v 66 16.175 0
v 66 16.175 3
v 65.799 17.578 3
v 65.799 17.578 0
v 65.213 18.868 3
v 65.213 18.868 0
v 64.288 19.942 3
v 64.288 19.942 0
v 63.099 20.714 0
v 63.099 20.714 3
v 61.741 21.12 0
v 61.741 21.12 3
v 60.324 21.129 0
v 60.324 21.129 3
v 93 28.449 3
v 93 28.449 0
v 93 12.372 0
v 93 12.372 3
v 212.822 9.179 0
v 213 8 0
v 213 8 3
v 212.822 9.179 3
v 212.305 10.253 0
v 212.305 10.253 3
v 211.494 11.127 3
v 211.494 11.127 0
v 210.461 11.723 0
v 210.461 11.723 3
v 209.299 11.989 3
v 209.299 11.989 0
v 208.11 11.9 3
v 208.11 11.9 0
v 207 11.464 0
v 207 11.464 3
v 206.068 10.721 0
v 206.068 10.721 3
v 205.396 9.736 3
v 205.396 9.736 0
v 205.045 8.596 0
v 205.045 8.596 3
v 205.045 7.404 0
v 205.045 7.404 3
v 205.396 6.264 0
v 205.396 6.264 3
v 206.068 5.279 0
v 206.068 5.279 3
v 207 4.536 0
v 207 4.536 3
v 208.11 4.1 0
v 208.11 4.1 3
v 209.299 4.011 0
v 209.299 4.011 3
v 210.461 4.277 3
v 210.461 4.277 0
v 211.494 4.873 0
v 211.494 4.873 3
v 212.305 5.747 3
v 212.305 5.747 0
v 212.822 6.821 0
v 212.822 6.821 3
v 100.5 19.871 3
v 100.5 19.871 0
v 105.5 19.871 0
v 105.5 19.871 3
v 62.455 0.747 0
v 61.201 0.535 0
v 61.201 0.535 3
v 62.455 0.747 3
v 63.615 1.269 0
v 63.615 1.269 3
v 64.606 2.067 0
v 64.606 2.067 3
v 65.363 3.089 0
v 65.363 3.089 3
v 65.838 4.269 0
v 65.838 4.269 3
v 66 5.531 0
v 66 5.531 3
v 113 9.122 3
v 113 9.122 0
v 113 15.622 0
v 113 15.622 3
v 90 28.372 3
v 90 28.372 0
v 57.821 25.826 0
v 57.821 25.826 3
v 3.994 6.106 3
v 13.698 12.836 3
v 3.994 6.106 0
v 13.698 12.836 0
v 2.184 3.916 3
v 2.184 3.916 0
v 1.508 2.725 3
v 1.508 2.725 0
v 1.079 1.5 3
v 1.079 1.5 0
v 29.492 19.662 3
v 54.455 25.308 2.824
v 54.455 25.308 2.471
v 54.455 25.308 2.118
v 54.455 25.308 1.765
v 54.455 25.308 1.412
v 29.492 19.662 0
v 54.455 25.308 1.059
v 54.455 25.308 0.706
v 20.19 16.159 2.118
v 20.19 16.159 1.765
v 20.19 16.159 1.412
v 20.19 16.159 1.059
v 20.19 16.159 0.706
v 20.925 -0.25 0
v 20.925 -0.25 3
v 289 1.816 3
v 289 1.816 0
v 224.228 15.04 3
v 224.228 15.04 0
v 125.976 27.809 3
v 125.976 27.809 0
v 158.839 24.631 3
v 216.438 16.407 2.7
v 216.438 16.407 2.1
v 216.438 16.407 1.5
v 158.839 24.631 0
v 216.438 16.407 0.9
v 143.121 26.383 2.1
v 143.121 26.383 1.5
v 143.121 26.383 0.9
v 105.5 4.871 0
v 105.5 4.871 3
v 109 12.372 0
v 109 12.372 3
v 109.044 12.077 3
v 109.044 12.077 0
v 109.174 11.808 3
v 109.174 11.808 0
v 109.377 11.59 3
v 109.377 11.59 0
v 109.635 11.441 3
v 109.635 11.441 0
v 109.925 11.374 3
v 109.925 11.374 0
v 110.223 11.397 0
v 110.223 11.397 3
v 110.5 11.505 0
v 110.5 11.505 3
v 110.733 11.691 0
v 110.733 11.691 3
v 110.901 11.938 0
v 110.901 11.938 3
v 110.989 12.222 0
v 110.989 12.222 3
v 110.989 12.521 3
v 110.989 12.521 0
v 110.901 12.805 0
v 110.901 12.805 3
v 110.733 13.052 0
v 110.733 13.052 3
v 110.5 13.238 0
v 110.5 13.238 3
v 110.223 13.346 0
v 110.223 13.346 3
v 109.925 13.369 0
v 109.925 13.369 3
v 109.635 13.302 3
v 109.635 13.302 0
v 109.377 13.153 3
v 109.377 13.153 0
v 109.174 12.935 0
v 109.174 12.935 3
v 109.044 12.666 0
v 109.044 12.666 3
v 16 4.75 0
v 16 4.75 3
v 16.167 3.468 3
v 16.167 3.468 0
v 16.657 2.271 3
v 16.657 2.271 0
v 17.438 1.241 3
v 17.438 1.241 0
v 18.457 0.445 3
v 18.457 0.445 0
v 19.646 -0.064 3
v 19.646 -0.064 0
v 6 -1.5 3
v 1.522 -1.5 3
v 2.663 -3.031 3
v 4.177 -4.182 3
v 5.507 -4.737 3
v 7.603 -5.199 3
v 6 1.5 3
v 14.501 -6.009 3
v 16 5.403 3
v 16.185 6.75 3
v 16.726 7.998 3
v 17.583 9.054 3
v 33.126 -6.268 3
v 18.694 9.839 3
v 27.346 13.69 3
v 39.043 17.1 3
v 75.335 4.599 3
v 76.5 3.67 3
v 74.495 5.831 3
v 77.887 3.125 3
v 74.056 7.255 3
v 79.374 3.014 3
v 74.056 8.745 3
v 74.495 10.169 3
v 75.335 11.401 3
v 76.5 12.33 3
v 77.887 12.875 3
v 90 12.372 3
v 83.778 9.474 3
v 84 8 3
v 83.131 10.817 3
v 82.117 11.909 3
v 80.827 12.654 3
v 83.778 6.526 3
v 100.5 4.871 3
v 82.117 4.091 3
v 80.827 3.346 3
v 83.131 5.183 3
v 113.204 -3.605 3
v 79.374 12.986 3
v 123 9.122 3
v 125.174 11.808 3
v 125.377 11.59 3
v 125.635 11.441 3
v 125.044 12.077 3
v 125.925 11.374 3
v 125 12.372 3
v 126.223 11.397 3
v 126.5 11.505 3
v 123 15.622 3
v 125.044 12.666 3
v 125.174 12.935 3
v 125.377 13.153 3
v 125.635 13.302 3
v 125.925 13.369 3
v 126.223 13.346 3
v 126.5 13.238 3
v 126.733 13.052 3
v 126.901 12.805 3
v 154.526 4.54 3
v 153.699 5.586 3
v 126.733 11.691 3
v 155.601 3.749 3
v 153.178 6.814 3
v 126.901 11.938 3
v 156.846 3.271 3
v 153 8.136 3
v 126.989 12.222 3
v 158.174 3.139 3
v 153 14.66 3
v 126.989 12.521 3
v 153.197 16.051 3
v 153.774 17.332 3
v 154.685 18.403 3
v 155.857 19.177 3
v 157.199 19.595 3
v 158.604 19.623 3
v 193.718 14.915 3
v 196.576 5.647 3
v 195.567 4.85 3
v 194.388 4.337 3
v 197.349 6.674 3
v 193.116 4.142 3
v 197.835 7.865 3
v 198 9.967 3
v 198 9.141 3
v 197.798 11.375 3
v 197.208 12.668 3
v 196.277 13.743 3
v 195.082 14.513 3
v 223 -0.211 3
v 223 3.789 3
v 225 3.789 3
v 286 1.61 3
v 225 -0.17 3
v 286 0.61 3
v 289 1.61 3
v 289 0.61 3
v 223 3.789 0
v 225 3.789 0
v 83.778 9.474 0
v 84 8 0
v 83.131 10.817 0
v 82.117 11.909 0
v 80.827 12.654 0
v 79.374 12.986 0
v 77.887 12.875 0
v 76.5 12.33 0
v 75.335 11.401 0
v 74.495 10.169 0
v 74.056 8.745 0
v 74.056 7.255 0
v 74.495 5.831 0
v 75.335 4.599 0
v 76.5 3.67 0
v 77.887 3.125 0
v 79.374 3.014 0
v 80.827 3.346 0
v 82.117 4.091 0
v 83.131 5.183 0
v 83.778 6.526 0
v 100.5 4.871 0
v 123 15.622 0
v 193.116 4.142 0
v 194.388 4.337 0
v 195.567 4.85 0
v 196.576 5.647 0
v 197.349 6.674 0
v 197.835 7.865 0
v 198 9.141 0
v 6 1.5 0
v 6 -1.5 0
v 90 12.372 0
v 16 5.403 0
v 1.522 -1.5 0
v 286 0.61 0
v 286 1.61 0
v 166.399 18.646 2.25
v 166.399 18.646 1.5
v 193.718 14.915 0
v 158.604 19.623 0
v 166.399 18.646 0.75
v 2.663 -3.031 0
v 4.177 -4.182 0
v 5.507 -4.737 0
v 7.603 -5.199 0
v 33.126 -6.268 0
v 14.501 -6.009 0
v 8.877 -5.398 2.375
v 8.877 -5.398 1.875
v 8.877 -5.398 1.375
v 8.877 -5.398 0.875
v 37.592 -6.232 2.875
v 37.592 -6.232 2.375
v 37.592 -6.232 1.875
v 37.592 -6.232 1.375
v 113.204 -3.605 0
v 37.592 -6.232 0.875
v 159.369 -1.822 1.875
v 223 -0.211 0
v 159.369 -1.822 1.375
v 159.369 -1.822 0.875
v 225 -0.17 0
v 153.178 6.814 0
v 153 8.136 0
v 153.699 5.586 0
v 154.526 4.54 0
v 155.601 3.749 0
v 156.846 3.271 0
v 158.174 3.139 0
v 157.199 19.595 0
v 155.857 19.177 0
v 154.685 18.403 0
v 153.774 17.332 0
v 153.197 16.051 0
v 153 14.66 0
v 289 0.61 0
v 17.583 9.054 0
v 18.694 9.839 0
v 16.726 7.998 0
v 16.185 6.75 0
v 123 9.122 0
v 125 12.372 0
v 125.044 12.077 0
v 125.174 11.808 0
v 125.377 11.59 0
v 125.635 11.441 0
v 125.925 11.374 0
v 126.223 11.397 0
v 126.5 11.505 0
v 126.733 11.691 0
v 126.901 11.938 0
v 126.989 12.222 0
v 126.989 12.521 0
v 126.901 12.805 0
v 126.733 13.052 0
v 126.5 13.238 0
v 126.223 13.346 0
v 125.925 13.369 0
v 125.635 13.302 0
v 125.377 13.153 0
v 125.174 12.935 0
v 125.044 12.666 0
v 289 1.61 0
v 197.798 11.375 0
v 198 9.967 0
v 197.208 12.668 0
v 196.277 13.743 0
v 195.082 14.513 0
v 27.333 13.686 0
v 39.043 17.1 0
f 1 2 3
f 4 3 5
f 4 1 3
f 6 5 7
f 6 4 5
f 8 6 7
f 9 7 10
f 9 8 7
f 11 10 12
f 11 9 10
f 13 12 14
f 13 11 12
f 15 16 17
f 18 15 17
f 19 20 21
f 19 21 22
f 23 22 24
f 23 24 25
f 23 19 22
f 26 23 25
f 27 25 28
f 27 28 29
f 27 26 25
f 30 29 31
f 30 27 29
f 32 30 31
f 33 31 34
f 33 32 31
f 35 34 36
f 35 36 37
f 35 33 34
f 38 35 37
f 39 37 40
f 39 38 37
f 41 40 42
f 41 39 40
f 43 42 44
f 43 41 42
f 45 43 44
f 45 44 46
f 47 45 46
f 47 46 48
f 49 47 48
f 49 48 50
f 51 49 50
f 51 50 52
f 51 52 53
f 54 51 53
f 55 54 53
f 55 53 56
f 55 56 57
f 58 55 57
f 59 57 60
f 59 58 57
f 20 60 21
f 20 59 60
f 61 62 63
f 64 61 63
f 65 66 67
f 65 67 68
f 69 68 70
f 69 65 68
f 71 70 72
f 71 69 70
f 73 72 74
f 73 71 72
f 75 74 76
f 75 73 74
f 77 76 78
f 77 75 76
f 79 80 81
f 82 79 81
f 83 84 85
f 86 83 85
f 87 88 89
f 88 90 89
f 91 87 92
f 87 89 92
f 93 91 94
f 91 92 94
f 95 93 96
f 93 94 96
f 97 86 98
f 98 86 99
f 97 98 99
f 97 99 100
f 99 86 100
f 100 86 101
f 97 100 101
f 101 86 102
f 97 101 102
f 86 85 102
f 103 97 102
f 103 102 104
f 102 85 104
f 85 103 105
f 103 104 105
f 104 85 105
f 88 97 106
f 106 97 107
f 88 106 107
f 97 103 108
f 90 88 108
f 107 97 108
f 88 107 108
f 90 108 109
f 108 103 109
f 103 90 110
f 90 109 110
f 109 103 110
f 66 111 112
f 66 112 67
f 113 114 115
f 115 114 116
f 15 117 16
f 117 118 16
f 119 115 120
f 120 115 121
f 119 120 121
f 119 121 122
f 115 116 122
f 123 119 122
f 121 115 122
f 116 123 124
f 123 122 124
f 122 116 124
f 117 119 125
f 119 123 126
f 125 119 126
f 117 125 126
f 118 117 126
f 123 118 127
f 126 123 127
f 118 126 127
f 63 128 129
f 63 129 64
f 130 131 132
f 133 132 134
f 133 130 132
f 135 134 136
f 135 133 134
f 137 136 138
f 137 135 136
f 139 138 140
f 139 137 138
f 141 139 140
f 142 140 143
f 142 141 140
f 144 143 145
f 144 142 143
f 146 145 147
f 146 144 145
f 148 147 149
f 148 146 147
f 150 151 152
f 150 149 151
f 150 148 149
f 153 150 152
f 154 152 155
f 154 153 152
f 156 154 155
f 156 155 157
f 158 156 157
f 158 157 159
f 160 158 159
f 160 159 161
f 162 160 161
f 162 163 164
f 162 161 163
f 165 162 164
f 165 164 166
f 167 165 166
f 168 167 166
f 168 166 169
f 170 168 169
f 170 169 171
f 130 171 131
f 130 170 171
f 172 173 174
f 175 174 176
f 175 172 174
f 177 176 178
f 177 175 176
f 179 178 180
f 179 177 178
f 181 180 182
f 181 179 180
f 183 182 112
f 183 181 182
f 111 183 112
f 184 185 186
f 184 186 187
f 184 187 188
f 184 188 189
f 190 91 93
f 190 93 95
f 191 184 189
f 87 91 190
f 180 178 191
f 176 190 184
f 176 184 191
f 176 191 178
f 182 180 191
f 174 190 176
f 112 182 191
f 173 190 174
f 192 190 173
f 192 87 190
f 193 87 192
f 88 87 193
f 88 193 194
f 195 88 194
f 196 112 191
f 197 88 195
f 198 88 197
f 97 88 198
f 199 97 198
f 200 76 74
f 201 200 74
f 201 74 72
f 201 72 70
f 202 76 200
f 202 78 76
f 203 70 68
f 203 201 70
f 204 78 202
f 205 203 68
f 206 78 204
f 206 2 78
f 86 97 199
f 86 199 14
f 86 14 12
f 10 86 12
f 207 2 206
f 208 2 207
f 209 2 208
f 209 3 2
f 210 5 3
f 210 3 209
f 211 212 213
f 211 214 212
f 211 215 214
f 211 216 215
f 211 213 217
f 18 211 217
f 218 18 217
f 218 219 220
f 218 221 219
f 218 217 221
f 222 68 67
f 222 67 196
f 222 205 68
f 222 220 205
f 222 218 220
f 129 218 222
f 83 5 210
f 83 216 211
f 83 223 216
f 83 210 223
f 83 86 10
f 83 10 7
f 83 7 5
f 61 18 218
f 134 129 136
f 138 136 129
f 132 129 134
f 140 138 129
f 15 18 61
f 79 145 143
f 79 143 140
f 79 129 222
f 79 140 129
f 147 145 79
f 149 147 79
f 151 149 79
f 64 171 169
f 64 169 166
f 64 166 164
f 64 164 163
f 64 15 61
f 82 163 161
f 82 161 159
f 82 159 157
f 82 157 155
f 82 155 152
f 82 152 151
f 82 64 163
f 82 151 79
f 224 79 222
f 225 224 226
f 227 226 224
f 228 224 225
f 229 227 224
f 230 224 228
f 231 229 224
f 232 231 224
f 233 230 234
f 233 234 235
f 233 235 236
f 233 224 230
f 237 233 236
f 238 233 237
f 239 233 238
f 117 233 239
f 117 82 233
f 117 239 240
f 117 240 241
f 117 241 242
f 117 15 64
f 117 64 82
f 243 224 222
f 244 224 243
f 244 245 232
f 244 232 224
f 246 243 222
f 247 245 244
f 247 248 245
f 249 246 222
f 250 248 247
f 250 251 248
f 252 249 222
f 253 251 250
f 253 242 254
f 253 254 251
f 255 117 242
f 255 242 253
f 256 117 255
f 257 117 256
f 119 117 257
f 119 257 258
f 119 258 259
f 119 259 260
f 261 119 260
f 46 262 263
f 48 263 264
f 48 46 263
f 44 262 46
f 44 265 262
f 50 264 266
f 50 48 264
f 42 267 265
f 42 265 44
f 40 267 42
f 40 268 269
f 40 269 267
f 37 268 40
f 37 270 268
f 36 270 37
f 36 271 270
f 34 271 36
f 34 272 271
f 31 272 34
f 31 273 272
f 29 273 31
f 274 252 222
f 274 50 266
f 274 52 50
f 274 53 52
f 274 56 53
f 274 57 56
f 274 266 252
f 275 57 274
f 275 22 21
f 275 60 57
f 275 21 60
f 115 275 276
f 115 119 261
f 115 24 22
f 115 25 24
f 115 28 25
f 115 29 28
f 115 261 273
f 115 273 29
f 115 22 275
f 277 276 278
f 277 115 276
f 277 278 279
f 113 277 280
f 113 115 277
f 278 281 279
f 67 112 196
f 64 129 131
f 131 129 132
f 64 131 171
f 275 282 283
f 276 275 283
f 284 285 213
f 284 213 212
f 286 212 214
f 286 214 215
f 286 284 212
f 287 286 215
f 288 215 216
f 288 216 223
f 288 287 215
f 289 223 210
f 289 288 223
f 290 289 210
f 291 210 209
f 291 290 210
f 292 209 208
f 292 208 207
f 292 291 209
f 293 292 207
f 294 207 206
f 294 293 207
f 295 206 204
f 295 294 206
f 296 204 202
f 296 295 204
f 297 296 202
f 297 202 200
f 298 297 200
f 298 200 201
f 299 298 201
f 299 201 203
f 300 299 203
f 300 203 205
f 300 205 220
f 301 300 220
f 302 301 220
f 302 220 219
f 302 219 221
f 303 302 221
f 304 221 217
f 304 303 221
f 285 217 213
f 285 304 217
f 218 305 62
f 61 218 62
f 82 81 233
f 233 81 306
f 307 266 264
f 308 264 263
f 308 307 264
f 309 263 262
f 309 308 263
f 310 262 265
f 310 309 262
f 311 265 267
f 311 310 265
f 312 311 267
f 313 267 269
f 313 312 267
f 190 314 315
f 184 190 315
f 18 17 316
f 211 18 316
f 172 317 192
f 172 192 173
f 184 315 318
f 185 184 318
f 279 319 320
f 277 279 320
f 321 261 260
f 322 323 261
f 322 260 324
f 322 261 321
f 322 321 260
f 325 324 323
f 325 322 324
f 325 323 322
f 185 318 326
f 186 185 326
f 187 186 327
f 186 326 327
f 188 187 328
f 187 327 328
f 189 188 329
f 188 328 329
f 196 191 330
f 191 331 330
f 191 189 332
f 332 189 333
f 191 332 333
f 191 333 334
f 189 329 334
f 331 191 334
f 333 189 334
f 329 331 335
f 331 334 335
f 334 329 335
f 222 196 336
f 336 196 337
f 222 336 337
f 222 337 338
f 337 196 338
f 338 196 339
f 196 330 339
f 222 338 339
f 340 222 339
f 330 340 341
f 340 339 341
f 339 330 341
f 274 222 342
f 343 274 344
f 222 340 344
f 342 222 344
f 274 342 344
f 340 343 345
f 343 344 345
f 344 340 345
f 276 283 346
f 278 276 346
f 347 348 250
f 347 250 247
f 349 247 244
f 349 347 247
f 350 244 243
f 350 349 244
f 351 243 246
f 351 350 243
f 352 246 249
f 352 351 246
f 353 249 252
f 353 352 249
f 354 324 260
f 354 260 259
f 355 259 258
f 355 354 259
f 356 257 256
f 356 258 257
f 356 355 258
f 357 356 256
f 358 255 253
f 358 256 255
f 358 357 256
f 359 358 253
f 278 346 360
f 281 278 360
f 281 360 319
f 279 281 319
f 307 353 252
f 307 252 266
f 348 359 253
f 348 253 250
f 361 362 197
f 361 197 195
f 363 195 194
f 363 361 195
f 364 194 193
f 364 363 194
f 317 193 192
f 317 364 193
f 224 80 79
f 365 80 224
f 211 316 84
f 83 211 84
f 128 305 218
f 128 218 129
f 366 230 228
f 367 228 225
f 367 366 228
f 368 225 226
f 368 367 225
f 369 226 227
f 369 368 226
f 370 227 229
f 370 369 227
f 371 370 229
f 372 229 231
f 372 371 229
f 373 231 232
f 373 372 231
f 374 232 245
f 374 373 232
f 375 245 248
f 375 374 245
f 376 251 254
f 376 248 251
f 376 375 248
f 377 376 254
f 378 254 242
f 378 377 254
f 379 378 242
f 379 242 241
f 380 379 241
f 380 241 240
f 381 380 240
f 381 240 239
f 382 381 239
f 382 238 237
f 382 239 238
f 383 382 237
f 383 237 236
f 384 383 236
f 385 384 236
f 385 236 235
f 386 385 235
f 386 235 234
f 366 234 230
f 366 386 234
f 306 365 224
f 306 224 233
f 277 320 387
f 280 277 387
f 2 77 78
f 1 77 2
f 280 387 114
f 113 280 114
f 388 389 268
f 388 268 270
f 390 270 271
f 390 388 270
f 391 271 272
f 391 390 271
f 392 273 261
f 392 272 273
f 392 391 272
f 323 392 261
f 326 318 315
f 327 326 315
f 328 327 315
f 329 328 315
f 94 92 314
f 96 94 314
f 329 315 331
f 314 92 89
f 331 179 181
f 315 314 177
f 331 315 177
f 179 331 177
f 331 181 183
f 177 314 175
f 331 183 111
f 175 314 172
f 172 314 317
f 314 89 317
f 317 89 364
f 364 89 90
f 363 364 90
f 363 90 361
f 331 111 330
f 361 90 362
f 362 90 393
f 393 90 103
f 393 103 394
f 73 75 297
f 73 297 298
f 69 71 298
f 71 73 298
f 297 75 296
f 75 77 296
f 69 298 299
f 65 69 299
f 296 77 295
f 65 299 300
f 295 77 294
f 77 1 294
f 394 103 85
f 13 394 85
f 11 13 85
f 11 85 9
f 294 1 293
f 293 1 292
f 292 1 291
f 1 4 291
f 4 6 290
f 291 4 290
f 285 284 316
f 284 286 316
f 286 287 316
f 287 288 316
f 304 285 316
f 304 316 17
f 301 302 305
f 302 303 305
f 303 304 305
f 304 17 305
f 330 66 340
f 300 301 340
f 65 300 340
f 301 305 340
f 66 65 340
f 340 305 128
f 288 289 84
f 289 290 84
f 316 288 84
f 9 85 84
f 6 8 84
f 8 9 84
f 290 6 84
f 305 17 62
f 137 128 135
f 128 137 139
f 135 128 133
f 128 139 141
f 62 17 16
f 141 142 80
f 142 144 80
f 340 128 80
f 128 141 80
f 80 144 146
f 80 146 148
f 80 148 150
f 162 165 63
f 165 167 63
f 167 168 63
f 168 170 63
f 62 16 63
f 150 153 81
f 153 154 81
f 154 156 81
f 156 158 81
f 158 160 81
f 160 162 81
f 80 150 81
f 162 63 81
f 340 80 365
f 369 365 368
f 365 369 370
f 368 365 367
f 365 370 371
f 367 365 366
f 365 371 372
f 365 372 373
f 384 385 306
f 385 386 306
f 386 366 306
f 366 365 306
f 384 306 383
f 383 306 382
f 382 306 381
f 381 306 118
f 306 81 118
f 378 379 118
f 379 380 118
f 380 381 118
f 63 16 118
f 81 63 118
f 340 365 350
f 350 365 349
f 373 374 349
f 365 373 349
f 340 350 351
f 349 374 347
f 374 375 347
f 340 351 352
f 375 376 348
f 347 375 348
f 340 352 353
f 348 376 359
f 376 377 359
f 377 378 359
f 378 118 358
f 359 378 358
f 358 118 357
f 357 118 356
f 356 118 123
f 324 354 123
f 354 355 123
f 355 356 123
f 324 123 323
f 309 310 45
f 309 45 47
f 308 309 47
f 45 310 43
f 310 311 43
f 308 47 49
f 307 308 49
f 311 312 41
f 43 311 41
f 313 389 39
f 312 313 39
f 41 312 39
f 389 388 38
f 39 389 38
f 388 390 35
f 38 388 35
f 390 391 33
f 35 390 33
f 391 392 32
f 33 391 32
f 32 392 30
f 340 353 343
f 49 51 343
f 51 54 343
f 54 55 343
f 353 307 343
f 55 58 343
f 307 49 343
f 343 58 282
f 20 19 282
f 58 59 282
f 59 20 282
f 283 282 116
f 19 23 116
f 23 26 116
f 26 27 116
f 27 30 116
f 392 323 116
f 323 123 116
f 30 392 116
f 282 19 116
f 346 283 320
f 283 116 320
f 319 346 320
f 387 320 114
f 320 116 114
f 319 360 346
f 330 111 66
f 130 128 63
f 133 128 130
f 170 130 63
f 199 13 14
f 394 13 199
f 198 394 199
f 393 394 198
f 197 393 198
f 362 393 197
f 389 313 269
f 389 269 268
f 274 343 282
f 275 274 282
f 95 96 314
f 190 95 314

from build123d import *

# Parameters (mm, degrees)
SKETCH_1_R          = 5
SKETCH_1_R_2        = 4
EXTRUDE_1_DEPTH     = 3
SKETCH_3_R          = 1
SKETCH_3_W          = 10
SKETCH_3_H          = 6.5
SKETCH_3_W_2        = 5
SKETCH_3_H_2        = 15
CUT_EXTRUDE_2_DEPTH = 291.422386836


with BuildPart() as part:
    # 草图1 → 凸台-拉伸1 (new body)
    with BuildSketch(Plane.XY):
        with BuildLine():
            Line((90, 12.3715), (90, 28.372426217))
            add(Edge.make_bspline(
                [(90, 28.372426217), (89.259446982, 28.350928743), (82.363996343, 28.13322439), (72.403347361, 27.586524792), (60.185862052, 26.226268085), (51.080991088, 24.79810862), (42.033943524, 23.000087944), (34.581994337, 21.174922903), (28.697351661, 19.44563851), (24.361981086, 17.983441115), (20.174828998, 16.207949367), (16.078941989, 14.139912989), (12.040296713, 11.946766626), (8.14011433, 9.56039573), (5.153679337, 7.316395724), (3.100060439, 5.200618052), (1.813825976, 3.470730924), (1.237398467, 2.180506339), (1.085380705, 1.529058937), (1.078882286, 1.5)],
                knots=[0.345773533, 0.345773533, 0.345773533, 0.345773533, 0.349398211, 0.379527288, 0.394591827, 0.409656366, 0.424720905, 0.439785444, 0.447317713, 0.454849983, 0.462382252, 0.469914522, 0.477446791, 0.484979061, 0.49251133, 0.496277465, 0.5000436, 0.503809734, 0.503985678, 0.503985678, 0.503985678, 0.503985678], degree=3))
            Line((1.078882286, 1.5), (6, 1.5))
            Line((6, 1.5), (6, -1.5))
            Line((6, -1.5), (1.522379628, -1.5))
            add(Edge.make_bspline(
                [(1.522379628, -1.5), (1.617903461, -1.678770523), (2.068186491, -2.42442122), (3.143139608, -3.601090845), (4.854253, -4.619355756), (6.927567017, -5.105597911), (9.209034621, -5.454839075), (12.219971865, -5.84289763), (16.020132359, -6.14266222), (20.609524976, -6.2611368), (25.231457517, -6.286948592), (31.397380169, -6.280305851), (39.107274969, -6.240736398), (48.336813051, -6.022096429), (57.579935967, -5.612990736), (66.840654471, -5.242934226), (76.096556555, -4.921715721), (88.435998513, -4.515955408), (103.853120896, -3.973102953), (122.354625015, -3.248110744), (140.857835973, -2.495489966), (159.368527813, -1.804089638), (177.884173919, -1.222493213), (196.4033921, -0.774877257), (211.439290174, -0.454334834), (220.305576898, -0.265987383), (223, -0.210849605)],
                knots=[0.510182255, 0.510182255, 0.510182255, 0.510182255, 0.511342004, 0.515108139, 0.518874273, 0.522640408, 0.526406543, 0.530172677, 0.537704947, 0.545237216, 0.552769486, 0.560301755, 0.575366294, 0.590430833, 0.605495372, 0.620559911, 0.63562445, 0.650688989, 0.680818067, 0.710947144, 0.741076222, 0.7712053, 0.801334378, 0.831463456, 0.861592533, 0.874744372, 0.874744372, 0.874744372, 0.874744372], degree=3))
            Line((223, -0.210849605), (223, 3.788737263))
            Line((223, 3.788737263), (225, 3.788737263))
            Line((225, 3.788737263), (225, -0.170338801))
            add(Edge.make_bspline(
                [(225, -0.170338801), (227.811595191, -0.114017747), (236.796798206, 0.056910764), (251.961175933, 0.256656825), (270.471854229, 0.429163033), (282.824771355, 0.587434741), (289, 0.610062865)],
                knots=[0.877998396, 0.877998396, 0.877998396, 0.877998396, 0.891721611, 0.921850689, 0.951979767, 0.982108845, 0.982108845, 0.982108845, 0.982108845], degree=3))
            Line((289, 0.610062865), (286, 0.610062865))
            Line((286, 0.610062865), (286, 1.610062865))
            Line((286, 1.610062865), (289, 1.610062865))
            Line((289, 1.610062865), (289, 1.816246039))
            add(Edge.make_bspline(
                [(289, 1.816246039), (276.957314444, 4.502285023), (258.861554155, 8.397620333), (234.648247971, 13.152786595), (216.448478593, 16.478914183), (198.182873559, 19.371550405), (179.850571346, 21.924148488), (161.503162682, 24.358614825), (143.127892269, 26.473190985), (124.712239059, 28.043780086), (107.994173705, 28.616385423), (97.416270032, 28.546670082), (93, 28.44913561)],
                knots=[0.017978355, 0.017978355, 0.017978355, 0.017978355, 0.07823651, 0.108365588, 0.138494666, 0.168623744, 0.198752821, 0.228881899, 0.259010977, 0.289140055, 0.319269133, 0.340879606, 0.340879606, 0.340879606, 0.340879606], degree=3))
            Line((93, 28.44913561), (93, 12.3715))
            Line((93, 12.3715), (90, 12.3715))
        make_face()
        with Locations((79, 8)):
            Circle(SKETCH_1_R, mode=Mode.SUBTRACT)
        with Locations((209, 8)):
            Circle(SKETCH_1_R_2, mode=Mode.SUBTRACT)
    extrude(amount=EXTRUDE_1_DEPTH)

    # 草图3 → 切除-拉伸2 (cut, through all)
    with BuildSketch(Plane.XY):
        with Locations(Location((110, 12.3715, 0), (0, 0, 180))):
            Circle(SKETCH_3_R)
        with Locations(Location((126, 12.3715, 0), (0, 0, 180))):
            Circle(SKETCH_3_R)
        with BuildLine():
            Line((16, 5.402967421), (16, 4.74959002))
            ThreePointArc((16, 4.74959002), (17.438137187, 1.240582567), (20.925253321, -0.249851242))
            add(Edge.make_bspline(
                [(20.925253321, -0.249851242), (22.914045789, -0.279585692), (24.903284625, -0.283778057), (29.14616948, -0.28369414), (31.399982567, -0.278002295), (38.161511328, -0.238823637), (42.669255398, -0.168803371), (51.680216376, 0.117967683), (56.183014764, 0.33147635), (60.85831542, 0.520784363), (61.02954636, 0.527691534), (61.200778311, 0.534573017)],
                knots=[0.014317915, 0.014317915, 0.014317915, 0.014317915, 0.020284927, 0.020284927, 0.027046569, 0.027046569, 0.040569854, 0.040569854, 0.054093138, 0.054093138, 0.054607249, 0.054607249, 0.054607249, 0.054607249], degree=3))
            ThreePointArc((61.200778311, 0.534573017), (64.605821096, 2.066719442), (66, 5.530540197))
            Line((66, 5.530540197), (66, 16.175207171))
            ThreePointArc((66, 16.175207171), (64.287676463, 19.942325894), (60.32352661, 21.129234195))
            add(Edge.make_bspline(
                [(60.32352661, 21.129234195), (59.143282742, 20.968071656), (57.964431768, 20.796736398), (53.109249428, 20.046773379), (49.445857595, 19.384253181), (42.158673028, 17.868714577), (38.533379611, 17.019586343), (33.148990447, 15.546220745), (31.362942012, 15.022439399), (27.821005995, 13.880218625), (26.067238608, 13.253271835), (22.635818059, 11.812670552), (20.957942753, 11.004847704), (19.099592195, 10.049689097), (18.896441621, 9.944700093), (18.693547477, 9.839213217)],
                knots=[0.029920383, 0.029920383, 0.029920383, 0.029920383, 0.033494004, 0.033494004, 0.044658672, 0.044658672, 0.05582334, 0.05582334, 0.061405674, 0.061405674, 0.066988008, 0.066988008, 0.072570342, 0.072570342, 0.073256353, 0.073256353, 0.073256353, 0.073256353], degree=3))
            ThreePointArc((18.693547477, 9.839213217), (16.726110517, 7.997937304), (16, 5.402967421))
        make_face()
        with Locations((118, 12.3715)):
            Rectangle(SKETCH_3_W, SKETCH_3_H)
        with Locations((103, 12.3715)):
            Rectangle(SKETCH_3_W_2, SKETCH_3_H_2)
        with BuildLine():
            Line((153, 14.659796962), (153, 8.136010376))
            ThreePointArc((153, 8.136010376), (154.52636013, 4.539647484), (158.17353042, 3.139022564))
            add(Edge.make_bspline(
                [(158.17353042, 3.139022564), (161.058246521, 3.239200114), (163.943505856, 3.335590583), (171.504636491, 3.576232826), (176.18199895, 3.713351663), (184.945921303, 3.946800138), (189.03214497, 4.046860263), (193.116453453, 4.14201244)],
                knots=[0.711426146, 0.711426146, 0.711426146, 0.711426146, 0.75, 0.75, 0.8125, 0.8125, 0.867133534, 0.867133534, 0.867133534, 0.867133534], degree=3))
            ThreePointArc((193.116453453, 4.14201244), (196.576469437, 5.64653729), (198, 9.140656115))
            Line((198, 9.140656115), (198, 9.967295711))
            ThreePointArc((198, 9.967295711), (196.781019979, 13.238975389), (193.718444833, 14.915410202))
            add(Edge.make_bspline(
                [(193.718444833, 14.915410202), (192.779013077, 15.051811632), (191.839123333, 15.187073825), (186.824226186, 15.902901834), (182.740892869, 16.465870736), (174.565909682, 17.575800313), (170.481299177, 18.120965891), (163.799588722, 18.980812945), (161.201113289, 19.307400191), (158.603501679, 19.623241907)],
                knots=[0.485575284, 0.485575284, 0.485575284, 0.485575284, 0.5, 0.5, 0.5625, 0.5625, 0.625, 0.625, 0.664795718, 0.664795718, 0.664795718, 0.664795718], degree=3))
            ThreePointArc((158.603501679, 19.623241907), (154.684695217, 18.402623995), (153, 14.659796962))
        make_face()
    extrude(amount=CUT_EXTRUDE_2_DEPTH, mode=Mode.SUBTRACT)


solid = part.part
